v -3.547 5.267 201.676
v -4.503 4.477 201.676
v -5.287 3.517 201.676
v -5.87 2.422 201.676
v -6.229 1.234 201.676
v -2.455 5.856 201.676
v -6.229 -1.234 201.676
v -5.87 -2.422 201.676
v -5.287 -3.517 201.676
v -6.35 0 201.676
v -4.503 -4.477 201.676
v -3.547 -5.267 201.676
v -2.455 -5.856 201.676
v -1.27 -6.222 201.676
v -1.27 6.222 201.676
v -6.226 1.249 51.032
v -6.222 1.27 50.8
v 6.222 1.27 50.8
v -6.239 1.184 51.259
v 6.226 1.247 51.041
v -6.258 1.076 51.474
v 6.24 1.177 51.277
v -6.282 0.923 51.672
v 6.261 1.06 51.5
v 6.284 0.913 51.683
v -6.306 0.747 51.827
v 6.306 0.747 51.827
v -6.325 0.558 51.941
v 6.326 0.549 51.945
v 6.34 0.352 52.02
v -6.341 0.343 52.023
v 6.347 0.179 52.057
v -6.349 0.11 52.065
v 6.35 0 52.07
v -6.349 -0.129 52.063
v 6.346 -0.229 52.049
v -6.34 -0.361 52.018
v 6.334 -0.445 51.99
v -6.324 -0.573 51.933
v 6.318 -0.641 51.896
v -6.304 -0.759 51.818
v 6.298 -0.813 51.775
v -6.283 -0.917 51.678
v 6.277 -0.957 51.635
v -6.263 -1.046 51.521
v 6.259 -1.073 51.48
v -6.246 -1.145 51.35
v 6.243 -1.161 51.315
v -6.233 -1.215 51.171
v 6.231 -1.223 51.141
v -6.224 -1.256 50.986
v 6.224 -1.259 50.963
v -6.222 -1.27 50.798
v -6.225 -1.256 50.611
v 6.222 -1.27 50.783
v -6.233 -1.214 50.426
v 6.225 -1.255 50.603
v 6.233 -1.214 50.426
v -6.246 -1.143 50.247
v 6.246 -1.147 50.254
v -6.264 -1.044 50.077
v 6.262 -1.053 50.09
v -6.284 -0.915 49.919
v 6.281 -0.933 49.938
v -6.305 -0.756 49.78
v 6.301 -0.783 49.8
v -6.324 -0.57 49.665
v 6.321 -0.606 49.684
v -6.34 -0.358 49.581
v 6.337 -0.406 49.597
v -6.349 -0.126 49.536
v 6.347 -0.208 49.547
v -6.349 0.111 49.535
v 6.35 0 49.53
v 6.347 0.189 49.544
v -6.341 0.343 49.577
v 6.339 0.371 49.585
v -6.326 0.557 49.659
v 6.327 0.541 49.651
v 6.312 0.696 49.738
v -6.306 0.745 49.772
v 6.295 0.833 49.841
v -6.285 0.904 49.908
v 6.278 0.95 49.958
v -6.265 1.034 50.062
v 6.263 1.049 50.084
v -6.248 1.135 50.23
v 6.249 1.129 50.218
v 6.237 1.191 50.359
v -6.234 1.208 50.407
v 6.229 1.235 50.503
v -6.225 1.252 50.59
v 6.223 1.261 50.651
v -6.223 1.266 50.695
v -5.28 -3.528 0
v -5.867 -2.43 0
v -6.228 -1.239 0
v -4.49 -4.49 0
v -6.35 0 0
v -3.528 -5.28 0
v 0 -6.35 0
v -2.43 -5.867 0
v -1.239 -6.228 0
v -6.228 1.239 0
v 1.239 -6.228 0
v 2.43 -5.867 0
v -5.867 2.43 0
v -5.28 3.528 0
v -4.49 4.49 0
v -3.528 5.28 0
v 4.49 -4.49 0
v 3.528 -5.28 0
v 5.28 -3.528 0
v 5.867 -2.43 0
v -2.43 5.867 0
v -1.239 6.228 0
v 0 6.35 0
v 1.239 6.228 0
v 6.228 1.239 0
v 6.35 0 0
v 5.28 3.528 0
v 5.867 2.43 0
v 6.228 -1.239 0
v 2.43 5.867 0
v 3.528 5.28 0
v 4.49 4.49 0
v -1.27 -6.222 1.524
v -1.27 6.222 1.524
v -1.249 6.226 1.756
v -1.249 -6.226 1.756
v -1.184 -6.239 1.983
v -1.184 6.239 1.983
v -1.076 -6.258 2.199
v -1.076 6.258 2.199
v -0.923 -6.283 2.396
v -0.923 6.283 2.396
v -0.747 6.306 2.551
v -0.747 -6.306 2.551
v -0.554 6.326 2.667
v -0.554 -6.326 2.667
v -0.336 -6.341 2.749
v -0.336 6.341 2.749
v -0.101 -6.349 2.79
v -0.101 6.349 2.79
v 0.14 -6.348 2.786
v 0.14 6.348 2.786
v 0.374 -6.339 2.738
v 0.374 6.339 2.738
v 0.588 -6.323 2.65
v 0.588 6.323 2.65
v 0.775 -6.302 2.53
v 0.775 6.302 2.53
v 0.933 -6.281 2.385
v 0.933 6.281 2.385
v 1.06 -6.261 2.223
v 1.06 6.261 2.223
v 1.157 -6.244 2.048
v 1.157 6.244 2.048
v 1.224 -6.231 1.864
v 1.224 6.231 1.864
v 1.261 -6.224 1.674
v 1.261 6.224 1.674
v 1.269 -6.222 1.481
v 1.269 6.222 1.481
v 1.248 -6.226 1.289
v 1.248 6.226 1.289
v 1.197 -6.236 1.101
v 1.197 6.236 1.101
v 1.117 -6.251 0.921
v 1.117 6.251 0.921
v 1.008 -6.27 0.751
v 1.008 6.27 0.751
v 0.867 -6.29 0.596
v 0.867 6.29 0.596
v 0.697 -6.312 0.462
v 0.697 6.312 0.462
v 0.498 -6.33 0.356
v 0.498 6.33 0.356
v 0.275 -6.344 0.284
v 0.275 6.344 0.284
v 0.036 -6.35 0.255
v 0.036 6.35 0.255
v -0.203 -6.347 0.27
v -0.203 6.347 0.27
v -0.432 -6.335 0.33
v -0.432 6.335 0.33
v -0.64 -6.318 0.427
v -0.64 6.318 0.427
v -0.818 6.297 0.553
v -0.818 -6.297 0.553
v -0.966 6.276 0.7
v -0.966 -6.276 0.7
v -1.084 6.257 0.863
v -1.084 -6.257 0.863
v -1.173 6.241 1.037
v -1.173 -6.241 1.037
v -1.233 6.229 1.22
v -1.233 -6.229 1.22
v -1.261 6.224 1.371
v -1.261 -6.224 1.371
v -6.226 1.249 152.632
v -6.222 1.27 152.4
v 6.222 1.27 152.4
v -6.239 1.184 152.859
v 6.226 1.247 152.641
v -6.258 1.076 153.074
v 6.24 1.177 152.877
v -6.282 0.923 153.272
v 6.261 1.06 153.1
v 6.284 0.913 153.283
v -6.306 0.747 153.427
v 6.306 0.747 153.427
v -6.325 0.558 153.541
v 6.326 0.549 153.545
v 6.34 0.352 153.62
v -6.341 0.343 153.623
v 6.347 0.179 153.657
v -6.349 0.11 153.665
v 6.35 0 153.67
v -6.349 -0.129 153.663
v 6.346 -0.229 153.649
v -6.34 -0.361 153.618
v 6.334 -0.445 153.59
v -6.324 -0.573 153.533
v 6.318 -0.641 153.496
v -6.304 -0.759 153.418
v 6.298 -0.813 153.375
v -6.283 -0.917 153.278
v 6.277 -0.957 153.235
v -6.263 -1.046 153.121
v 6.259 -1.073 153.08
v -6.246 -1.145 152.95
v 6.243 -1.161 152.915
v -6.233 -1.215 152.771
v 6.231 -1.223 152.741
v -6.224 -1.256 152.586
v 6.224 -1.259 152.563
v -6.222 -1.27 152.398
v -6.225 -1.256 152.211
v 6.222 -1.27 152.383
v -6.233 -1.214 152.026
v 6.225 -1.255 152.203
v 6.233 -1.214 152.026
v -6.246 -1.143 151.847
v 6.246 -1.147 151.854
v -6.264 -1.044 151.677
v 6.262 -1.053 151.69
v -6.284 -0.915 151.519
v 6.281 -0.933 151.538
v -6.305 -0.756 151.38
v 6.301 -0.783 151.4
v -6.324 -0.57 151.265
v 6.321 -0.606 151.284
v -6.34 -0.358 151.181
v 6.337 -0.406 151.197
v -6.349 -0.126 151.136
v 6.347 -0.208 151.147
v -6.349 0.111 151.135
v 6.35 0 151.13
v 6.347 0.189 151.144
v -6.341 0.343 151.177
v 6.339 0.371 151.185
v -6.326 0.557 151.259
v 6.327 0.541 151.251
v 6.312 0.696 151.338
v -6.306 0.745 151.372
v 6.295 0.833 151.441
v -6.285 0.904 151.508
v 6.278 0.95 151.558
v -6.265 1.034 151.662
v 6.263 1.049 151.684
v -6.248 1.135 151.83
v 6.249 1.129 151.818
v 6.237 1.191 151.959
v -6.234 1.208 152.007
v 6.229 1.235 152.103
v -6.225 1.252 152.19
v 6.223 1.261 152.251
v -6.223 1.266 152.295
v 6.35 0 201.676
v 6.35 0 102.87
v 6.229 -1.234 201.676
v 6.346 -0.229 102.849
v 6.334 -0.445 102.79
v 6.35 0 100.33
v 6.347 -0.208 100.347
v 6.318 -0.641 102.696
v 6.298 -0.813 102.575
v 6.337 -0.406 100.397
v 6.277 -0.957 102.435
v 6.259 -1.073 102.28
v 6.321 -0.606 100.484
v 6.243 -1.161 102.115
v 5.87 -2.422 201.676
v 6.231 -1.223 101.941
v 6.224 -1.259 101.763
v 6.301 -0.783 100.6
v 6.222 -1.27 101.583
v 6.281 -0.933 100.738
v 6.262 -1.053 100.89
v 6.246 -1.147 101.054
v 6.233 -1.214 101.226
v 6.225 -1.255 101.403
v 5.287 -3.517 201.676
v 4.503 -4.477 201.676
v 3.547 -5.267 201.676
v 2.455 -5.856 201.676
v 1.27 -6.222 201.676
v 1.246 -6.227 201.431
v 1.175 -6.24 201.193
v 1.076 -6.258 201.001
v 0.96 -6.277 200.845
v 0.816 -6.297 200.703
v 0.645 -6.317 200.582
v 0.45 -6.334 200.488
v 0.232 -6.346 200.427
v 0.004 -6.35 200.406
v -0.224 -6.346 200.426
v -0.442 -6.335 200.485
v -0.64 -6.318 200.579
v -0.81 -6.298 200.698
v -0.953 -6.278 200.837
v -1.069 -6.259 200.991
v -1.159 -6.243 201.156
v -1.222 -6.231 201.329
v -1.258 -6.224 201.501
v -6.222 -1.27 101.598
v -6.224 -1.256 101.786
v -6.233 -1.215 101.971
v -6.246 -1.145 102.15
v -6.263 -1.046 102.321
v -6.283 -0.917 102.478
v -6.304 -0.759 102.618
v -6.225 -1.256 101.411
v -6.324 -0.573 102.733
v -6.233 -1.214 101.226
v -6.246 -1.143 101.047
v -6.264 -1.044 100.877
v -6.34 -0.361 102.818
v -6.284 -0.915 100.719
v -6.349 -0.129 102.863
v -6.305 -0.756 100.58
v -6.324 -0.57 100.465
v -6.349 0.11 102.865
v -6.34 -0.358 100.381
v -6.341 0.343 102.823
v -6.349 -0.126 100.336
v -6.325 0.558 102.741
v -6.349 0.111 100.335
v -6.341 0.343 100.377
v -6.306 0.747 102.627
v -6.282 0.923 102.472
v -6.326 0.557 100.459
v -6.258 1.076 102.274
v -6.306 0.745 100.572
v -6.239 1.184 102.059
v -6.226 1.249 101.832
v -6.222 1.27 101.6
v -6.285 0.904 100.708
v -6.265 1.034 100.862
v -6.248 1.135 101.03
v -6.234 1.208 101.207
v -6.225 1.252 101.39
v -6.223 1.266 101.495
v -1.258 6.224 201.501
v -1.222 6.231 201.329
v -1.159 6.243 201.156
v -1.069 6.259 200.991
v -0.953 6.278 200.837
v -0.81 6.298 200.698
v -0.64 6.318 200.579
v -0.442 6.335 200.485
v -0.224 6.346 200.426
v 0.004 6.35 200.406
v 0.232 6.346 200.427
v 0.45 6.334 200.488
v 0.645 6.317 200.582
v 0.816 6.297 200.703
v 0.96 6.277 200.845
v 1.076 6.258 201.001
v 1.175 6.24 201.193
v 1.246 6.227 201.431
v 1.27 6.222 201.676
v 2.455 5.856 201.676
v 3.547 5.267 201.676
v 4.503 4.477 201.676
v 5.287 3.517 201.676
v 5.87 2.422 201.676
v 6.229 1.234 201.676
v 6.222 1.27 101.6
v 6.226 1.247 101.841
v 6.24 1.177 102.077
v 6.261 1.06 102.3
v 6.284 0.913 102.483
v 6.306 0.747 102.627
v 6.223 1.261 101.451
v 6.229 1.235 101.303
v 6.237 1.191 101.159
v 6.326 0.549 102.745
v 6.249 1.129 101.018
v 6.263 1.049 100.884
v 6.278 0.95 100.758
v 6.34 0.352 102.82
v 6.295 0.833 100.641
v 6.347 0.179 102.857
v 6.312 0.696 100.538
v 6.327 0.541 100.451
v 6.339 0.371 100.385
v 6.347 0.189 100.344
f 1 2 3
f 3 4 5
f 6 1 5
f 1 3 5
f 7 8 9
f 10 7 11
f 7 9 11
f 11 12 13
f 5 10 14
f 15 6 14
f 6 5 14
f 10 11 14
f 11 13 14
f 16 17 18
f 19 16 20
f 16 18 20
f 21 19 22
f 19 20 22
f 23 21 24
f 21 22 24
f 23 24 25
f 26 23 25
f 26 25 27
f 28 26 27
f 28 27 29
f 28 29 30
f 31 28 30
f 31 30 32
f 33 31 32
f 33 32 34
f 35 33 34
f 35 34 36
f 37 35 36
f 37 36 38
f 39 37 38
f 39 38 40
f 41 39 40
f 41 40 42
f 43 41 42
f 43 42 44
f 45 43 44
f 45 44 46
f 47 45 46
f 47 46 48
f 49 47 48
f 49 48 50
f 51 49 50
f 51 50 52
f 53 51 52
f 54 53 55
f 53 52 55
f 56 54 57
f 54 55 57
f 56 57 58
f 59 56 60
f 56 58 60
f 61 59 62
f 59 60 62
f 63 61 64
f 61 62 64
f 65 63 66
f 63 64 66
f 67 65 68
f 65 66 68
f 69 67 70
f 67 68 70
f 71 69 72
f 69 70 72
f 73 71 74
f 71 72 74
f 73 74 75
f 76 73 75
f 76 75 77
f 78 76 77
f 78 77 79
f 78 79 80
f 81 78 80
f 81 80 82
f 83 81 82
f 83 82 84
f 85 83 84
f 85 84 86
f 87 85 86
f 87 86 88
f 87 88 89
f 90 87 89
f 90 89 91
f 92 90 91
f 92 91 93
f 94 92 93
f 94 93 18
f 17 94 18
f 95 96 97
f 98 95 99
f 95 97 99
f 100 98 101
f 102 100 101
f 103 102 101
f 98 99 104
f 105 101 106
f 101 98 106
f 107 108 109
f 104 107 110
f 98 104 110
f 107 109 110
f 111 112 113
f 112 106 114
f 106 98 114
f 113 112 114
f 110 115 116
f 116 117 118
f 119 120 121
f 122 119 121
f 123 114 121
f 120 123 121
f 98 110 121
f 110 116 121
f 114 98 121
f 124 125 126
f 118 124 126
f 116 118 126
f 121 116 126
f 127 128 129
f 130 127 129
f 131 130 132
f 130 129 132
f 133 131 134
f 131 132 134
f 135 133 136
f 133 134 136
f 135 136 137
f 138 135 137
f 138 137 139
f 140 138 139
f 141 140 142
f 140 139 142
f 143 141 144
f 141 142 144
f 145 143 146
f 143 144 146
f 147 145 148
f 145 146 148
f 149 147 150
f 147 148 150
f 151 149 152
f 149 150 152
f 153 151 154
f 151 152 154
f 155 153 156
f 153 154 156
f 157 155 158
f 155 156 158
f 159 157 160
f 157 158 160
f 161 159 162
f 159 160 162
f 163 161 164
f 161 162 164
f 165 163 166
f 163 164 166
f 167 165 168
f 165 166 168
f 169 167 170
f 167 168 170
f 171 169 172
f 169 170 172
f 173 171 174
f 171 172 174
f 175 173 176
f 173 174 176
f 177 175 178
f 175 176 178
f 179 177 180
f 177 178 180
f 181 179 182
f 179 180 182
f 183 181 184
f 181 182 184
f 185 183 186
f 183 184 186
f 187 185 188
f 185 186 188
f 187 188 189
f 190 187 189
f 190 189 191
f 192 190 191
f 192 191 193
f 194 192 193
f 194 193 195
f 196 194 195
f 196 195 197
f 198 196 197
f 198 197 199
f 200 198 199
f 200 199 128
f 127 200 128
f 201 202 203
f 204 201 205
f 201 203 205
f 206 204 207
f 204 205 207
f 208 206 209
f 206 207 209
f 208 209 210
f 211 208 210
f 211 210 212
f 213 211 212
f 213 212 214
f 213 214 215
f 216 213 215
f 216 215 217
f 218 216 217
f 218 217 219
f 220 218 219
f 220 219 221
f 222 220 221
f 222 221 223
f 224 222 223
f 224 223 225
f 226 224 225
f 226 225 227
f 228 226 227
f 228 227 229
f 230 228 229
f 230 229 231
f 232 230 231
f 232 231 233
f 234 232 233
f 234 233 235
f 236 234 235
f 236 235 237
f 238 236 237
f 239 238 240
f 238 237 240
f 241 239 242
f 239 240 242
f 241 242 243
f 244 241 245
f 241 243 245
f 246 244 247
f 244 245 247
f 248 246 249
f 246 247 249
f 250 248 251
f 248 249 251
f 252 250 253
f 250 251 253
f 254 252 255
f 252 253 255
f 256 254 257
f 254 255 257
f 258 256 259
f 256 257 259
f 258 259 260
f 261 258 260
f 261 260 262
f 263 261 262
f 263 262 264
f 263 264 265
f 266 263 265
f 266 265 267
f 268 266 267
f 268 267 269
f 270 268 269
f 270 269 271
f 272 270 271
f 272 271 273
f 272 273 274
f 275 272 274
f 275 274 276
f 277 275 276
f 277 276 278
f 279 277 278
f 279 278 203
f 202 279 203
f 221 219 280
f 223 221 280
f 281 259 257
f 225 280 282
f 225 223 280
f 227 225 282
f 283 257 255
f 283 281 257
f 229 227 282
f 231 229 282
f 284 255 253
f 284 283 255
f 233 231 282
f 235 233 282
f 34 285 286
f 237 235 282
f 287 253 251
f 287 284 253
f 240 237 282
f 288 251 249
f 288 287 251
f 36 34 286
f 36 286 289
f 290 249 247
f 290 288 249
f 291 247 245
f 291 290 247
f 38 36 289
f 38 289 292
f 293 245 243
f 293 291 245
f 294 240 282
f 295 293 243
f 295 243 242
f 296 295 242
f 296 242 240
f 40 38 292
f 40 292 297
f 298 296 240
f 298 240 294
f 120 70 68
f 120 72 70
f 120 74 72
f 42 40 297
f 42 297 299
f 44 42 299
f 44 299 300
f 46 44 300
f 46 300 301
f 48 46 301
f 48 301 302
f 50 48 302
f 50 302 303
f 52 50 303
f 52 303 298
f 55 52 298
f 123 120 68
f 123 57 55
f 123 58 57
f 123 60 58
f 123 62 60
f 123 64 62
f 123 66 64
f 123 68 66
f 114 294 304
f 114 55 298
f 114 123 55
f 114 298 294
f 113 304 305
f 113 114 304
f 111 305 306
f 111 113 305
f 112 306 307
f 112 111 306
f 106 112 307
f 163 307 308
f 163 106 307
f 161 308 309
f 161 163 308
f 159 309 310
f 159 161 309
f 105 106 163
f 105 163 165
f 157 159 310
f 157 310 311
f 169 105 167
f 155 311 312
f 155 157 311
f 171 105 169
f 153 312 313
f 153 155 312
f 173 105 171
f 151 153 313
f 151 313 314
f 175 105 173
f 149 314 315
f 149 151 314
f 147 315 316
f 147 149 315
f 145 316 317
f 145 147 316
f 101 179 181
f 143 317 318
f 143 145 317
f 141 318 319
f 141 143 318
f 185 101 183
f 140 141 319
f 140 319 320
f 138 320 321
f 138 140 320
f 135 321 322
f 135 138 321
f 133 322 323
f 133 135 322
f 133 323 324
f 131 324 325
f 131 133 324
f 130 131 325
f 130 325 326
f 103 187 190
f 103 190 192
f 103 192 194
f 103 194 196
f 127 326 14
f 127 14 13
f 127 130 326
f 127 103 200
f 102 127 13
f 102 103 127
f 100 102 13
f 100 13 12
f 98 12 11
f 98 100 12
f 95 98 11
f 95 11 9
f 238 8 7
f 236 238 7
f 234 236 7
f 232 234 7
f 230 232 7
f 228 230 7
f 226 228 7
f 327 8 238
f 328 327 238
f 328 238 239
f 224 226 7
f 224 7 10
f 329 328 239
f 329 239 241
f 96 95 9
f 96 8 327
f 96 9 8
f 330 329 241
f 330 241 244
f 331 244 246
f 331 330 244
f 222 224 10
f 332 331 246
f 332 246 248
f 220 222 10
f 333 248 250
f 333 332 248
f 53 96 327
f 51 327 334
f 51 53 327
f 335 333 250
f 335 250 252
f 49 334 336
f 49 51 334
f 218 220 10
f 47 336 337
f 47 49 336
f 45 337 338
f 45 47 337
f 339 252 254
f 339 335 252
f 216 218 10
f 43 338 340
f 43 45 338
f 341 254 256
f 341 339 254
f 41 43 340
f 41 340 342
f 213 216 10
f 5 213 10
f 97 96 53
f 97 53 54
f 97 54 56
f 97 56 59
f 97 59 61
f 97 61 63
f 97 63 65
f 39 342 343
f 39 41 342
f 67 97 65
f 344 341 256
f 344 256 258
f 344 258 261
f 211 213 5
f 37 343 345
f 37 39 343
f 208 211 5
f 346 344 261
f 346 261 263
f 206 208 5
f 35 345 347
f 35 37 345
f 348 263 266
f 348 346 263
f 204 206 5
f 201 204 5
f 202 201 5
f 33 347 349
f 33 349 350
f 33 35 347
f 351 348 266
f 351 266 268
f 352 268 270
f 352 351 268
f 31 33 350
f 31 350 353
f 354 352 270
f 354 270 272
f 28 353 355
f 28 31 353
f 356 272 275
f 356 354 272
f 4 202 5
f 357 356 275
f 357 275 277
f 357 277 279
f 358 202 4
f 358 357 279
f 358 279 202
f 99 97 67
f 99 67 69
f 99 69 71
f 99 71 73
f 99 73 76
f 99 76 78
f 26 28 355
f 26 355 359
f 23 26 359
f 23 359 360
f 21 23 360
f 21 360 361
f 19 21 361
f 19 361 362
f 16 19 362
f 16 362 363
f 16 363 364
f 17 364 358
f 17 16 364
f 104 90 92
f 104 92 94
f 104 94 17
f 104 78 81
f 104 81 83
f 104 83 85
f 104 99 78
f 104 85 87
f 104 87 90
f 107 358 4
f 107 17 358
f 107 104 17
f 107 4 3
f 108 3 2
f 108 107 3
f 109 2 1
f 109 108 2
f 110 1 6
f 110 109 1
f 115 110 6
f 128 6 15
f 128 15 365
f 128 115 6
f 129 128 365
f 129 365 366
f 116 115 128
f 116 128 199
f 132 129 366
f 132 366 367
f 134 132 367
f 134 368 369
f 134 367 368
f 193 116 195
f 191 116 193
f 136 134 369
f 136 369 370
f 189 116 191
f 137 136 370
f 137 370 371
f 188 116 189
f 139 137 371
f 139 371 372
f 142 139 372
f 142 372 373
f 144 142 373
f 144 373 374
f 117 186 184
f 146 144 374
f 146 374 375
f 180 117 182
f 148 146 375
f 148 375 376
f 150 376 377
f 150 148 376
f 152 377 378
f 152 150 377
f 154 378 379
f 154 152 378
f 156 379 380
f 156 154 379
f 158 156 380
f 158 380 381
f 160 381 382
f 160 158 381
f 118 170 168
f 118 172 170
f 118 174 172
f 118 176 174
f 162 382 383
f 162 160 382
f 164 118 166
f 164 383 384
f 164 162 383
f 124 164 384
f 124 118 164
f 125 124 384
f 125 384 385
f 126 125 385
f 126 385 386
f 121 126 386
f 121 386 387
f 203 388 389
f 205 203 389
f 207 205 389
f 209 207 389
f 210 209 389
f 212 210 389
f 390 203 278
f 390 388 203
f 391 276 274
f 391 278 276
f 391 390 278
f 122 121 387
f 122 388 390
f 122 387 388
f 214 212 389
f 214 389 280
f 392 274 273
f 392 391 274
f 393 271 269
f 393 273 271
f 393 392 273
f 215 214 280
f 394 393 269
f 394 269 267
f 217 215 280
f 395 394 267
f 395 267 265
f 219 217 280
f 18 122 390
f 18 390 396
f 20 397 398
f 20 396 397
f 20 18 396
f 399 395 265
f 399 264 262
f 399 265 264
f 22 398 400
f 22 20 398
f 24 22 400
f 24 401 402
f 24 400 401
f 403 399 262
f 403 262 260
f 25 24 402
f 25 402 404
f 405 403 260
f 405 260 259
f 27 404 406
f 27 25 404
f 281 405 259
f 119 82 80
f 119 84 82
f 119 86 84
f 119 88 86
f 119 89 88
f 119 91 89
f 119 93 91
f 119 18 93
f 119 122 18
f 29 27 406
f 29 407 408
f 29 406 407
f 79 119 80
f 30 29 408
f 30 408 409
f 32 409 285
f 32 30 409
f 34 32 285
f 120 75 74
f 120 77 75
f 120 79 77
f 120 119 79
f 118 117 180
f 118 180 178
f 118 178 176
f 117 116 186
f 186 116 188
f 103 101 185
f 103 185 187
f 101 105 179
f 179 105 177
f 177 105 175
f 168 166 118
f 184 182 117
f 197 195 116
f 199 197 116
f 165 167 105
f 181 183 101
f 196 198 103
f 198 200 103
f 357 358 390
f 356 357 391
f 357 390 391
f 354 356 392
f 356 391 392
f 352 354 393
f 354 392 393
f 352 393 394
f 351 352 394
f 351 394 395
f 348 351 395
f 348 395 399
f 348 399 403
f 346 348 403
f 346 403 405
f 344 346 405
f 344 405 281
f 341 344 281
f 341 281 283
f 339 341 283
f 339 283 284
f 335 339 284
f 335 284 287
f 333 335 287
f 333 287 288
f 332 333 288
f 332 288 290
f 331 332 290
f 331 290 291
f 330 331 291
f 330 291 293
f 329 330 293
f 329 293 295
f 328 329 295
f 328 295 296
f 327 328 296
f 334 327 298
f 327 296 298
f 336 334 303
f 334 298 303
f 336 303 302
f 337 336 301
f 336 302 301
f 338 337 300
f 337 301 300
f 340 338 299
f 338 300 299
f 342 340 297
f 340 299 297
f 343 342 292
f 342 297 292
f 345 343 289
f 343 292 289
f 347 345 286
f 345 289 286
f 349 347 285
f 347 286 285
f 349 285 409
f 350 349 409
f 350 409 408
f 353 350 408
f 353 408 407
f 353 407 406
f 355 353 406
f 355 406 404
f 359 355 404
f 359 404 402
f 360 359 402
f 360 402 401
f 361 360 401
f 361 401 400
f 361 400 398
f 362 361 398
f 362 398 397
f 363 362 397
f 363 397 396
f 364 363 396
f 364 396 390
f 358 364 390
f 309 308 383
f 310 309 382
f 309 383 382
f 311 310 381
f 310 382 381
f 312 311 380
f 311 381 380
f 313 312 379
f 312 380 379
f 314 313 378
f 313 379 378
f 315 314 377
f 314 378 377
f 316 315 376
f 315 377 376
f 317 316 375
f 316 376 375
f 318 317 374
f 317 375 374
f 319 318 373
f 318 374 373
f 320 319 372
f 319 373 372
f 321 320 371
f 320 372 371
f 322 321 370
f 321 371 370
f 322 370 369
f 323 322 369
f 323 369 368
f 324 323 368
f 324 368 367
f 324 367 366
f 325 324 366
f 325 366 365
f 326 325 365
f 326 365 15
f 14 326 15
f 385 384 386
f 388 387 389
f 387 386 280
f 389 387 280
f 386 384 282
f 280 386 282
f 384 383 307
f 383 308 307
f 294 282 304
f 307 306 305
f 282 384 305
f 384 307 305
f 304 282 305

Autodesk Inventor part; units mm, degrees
ref_plane "YZ Plane" through (0, 0, 0) normal (1, 0, 0) x (0, 1, 0)
ref_plane "XZ Plane" through (0, 0, 0) normal (0, 1, 0) x (-1, 0, 0)
ref_plane "XY Plane" through (0, 0, 0) normal (0, 0, 1) x (1, 0, 0)
sketch "Sketch1" plane through (0, 0, 0) normal (0, 0, 1) x (1, 0, 0)
  circle A0 centre (0, 0) radius 6.35
  dimension "d0" = 12.7
extrude "Extrusion1" add sketch "Sketch1" along normal blind 203.2
sketch "Sketch4" plane through (0, 0, 0) normal (0, 1, 0) x (-1, 0, 0)
  line L0 (0, 0) -> (0, 1.524)
  line L1 (6.35, 203.2) -> (-6.35, 203.2) projected
  line L2 (0, 203.2) -> (0, 201.676)
  circle A0 centre (0, 201.676) radius 1.27
  circle A1 centre (0, 1.524) radius 1.27
  dimension "d13" = 1.524
  dimension "d15" = 1.524
  dimension "d16" = 2.54
  dimension "d19" = 2.54
extrude "Extrusion4" cut sketch "Sketch4" along normal mid plane 15.24
sketch "Sketch5" plane through (0, 0, 0) normal (0, 1, 0) x (-1, 0, 0)
  line L0 (0, 1.524) -> (-1.27, 1.524)
  line L1 (-6.35, 0) -> (6.35, 0) projected
  line L2 (-1.27, 0) -> (1.27, 0)
  line L3 (1.27, 1.524) -> (0, 1.524)
  line L4 (1.27, 1.524) -> (6.35, 1.524)
  line L5 (6.35, 0) -> (6.35, 203.2) projected
  line L6 (6.35, 1.524) -> (-6.35, 1.524)
  line L7 (-6.35, 1.524) -> (-6.35, 0)
  line L8 (-6.35, 0) -> (6.35, 0)
  line L9 (6.35, 0) -> (6.35, 1.524)
  line L10 (6.35, 203.2) -> (-6.35, 203.2) projected
  line L11 (-6.35, 203.2) -> (6.35, 203.2)
  line L12 (6.35, 203.2) -> (6.35, 201.676)
  line L13 (6.35, 201.676) -> (-6.35, 201.676)
  line L14 (-6.35, 201.676) -> (-6.35, 203.2)
  point P0 (0, 0)
  dimension "d20" = 1.524
  dimension "d21" = 1.27
  dimension "d26" = 12.7
  dimension "d27" = 1.524
sketch "Sketch7" plane through (0, 0, 0) normal (1, 0, 0) x (0, 1, 0)
  line L0 (0, 0) -> (0, 50.8)
  circle A0 centre (0, 50.8) radius 1.27
  line L1 (0, 50.8) -> (0, 101.6)
  circle A1 centre (0, 101.6) radius 1.27
  line L2 (0, 101.6) -> (0, 152.4)
  circle A2 centre (0, 152.4) radius 1.27
  dimension "d42" = 50.8
  dimension "d43" = 2.54
  dimension "d44" = 50.8
  dimension "d45" = 2.54
  dimension "d46" = 50.8
  dimension "d47" = 2.54
extrude "Extrusion8" cut sketch "Sketch7" along normal mid plane 25.4
extrude "Extrusion9" cut sketch "Sketch5" along normal mid plane 25.4 contours L13 L14 L10 L5
properties part number "Straw"
